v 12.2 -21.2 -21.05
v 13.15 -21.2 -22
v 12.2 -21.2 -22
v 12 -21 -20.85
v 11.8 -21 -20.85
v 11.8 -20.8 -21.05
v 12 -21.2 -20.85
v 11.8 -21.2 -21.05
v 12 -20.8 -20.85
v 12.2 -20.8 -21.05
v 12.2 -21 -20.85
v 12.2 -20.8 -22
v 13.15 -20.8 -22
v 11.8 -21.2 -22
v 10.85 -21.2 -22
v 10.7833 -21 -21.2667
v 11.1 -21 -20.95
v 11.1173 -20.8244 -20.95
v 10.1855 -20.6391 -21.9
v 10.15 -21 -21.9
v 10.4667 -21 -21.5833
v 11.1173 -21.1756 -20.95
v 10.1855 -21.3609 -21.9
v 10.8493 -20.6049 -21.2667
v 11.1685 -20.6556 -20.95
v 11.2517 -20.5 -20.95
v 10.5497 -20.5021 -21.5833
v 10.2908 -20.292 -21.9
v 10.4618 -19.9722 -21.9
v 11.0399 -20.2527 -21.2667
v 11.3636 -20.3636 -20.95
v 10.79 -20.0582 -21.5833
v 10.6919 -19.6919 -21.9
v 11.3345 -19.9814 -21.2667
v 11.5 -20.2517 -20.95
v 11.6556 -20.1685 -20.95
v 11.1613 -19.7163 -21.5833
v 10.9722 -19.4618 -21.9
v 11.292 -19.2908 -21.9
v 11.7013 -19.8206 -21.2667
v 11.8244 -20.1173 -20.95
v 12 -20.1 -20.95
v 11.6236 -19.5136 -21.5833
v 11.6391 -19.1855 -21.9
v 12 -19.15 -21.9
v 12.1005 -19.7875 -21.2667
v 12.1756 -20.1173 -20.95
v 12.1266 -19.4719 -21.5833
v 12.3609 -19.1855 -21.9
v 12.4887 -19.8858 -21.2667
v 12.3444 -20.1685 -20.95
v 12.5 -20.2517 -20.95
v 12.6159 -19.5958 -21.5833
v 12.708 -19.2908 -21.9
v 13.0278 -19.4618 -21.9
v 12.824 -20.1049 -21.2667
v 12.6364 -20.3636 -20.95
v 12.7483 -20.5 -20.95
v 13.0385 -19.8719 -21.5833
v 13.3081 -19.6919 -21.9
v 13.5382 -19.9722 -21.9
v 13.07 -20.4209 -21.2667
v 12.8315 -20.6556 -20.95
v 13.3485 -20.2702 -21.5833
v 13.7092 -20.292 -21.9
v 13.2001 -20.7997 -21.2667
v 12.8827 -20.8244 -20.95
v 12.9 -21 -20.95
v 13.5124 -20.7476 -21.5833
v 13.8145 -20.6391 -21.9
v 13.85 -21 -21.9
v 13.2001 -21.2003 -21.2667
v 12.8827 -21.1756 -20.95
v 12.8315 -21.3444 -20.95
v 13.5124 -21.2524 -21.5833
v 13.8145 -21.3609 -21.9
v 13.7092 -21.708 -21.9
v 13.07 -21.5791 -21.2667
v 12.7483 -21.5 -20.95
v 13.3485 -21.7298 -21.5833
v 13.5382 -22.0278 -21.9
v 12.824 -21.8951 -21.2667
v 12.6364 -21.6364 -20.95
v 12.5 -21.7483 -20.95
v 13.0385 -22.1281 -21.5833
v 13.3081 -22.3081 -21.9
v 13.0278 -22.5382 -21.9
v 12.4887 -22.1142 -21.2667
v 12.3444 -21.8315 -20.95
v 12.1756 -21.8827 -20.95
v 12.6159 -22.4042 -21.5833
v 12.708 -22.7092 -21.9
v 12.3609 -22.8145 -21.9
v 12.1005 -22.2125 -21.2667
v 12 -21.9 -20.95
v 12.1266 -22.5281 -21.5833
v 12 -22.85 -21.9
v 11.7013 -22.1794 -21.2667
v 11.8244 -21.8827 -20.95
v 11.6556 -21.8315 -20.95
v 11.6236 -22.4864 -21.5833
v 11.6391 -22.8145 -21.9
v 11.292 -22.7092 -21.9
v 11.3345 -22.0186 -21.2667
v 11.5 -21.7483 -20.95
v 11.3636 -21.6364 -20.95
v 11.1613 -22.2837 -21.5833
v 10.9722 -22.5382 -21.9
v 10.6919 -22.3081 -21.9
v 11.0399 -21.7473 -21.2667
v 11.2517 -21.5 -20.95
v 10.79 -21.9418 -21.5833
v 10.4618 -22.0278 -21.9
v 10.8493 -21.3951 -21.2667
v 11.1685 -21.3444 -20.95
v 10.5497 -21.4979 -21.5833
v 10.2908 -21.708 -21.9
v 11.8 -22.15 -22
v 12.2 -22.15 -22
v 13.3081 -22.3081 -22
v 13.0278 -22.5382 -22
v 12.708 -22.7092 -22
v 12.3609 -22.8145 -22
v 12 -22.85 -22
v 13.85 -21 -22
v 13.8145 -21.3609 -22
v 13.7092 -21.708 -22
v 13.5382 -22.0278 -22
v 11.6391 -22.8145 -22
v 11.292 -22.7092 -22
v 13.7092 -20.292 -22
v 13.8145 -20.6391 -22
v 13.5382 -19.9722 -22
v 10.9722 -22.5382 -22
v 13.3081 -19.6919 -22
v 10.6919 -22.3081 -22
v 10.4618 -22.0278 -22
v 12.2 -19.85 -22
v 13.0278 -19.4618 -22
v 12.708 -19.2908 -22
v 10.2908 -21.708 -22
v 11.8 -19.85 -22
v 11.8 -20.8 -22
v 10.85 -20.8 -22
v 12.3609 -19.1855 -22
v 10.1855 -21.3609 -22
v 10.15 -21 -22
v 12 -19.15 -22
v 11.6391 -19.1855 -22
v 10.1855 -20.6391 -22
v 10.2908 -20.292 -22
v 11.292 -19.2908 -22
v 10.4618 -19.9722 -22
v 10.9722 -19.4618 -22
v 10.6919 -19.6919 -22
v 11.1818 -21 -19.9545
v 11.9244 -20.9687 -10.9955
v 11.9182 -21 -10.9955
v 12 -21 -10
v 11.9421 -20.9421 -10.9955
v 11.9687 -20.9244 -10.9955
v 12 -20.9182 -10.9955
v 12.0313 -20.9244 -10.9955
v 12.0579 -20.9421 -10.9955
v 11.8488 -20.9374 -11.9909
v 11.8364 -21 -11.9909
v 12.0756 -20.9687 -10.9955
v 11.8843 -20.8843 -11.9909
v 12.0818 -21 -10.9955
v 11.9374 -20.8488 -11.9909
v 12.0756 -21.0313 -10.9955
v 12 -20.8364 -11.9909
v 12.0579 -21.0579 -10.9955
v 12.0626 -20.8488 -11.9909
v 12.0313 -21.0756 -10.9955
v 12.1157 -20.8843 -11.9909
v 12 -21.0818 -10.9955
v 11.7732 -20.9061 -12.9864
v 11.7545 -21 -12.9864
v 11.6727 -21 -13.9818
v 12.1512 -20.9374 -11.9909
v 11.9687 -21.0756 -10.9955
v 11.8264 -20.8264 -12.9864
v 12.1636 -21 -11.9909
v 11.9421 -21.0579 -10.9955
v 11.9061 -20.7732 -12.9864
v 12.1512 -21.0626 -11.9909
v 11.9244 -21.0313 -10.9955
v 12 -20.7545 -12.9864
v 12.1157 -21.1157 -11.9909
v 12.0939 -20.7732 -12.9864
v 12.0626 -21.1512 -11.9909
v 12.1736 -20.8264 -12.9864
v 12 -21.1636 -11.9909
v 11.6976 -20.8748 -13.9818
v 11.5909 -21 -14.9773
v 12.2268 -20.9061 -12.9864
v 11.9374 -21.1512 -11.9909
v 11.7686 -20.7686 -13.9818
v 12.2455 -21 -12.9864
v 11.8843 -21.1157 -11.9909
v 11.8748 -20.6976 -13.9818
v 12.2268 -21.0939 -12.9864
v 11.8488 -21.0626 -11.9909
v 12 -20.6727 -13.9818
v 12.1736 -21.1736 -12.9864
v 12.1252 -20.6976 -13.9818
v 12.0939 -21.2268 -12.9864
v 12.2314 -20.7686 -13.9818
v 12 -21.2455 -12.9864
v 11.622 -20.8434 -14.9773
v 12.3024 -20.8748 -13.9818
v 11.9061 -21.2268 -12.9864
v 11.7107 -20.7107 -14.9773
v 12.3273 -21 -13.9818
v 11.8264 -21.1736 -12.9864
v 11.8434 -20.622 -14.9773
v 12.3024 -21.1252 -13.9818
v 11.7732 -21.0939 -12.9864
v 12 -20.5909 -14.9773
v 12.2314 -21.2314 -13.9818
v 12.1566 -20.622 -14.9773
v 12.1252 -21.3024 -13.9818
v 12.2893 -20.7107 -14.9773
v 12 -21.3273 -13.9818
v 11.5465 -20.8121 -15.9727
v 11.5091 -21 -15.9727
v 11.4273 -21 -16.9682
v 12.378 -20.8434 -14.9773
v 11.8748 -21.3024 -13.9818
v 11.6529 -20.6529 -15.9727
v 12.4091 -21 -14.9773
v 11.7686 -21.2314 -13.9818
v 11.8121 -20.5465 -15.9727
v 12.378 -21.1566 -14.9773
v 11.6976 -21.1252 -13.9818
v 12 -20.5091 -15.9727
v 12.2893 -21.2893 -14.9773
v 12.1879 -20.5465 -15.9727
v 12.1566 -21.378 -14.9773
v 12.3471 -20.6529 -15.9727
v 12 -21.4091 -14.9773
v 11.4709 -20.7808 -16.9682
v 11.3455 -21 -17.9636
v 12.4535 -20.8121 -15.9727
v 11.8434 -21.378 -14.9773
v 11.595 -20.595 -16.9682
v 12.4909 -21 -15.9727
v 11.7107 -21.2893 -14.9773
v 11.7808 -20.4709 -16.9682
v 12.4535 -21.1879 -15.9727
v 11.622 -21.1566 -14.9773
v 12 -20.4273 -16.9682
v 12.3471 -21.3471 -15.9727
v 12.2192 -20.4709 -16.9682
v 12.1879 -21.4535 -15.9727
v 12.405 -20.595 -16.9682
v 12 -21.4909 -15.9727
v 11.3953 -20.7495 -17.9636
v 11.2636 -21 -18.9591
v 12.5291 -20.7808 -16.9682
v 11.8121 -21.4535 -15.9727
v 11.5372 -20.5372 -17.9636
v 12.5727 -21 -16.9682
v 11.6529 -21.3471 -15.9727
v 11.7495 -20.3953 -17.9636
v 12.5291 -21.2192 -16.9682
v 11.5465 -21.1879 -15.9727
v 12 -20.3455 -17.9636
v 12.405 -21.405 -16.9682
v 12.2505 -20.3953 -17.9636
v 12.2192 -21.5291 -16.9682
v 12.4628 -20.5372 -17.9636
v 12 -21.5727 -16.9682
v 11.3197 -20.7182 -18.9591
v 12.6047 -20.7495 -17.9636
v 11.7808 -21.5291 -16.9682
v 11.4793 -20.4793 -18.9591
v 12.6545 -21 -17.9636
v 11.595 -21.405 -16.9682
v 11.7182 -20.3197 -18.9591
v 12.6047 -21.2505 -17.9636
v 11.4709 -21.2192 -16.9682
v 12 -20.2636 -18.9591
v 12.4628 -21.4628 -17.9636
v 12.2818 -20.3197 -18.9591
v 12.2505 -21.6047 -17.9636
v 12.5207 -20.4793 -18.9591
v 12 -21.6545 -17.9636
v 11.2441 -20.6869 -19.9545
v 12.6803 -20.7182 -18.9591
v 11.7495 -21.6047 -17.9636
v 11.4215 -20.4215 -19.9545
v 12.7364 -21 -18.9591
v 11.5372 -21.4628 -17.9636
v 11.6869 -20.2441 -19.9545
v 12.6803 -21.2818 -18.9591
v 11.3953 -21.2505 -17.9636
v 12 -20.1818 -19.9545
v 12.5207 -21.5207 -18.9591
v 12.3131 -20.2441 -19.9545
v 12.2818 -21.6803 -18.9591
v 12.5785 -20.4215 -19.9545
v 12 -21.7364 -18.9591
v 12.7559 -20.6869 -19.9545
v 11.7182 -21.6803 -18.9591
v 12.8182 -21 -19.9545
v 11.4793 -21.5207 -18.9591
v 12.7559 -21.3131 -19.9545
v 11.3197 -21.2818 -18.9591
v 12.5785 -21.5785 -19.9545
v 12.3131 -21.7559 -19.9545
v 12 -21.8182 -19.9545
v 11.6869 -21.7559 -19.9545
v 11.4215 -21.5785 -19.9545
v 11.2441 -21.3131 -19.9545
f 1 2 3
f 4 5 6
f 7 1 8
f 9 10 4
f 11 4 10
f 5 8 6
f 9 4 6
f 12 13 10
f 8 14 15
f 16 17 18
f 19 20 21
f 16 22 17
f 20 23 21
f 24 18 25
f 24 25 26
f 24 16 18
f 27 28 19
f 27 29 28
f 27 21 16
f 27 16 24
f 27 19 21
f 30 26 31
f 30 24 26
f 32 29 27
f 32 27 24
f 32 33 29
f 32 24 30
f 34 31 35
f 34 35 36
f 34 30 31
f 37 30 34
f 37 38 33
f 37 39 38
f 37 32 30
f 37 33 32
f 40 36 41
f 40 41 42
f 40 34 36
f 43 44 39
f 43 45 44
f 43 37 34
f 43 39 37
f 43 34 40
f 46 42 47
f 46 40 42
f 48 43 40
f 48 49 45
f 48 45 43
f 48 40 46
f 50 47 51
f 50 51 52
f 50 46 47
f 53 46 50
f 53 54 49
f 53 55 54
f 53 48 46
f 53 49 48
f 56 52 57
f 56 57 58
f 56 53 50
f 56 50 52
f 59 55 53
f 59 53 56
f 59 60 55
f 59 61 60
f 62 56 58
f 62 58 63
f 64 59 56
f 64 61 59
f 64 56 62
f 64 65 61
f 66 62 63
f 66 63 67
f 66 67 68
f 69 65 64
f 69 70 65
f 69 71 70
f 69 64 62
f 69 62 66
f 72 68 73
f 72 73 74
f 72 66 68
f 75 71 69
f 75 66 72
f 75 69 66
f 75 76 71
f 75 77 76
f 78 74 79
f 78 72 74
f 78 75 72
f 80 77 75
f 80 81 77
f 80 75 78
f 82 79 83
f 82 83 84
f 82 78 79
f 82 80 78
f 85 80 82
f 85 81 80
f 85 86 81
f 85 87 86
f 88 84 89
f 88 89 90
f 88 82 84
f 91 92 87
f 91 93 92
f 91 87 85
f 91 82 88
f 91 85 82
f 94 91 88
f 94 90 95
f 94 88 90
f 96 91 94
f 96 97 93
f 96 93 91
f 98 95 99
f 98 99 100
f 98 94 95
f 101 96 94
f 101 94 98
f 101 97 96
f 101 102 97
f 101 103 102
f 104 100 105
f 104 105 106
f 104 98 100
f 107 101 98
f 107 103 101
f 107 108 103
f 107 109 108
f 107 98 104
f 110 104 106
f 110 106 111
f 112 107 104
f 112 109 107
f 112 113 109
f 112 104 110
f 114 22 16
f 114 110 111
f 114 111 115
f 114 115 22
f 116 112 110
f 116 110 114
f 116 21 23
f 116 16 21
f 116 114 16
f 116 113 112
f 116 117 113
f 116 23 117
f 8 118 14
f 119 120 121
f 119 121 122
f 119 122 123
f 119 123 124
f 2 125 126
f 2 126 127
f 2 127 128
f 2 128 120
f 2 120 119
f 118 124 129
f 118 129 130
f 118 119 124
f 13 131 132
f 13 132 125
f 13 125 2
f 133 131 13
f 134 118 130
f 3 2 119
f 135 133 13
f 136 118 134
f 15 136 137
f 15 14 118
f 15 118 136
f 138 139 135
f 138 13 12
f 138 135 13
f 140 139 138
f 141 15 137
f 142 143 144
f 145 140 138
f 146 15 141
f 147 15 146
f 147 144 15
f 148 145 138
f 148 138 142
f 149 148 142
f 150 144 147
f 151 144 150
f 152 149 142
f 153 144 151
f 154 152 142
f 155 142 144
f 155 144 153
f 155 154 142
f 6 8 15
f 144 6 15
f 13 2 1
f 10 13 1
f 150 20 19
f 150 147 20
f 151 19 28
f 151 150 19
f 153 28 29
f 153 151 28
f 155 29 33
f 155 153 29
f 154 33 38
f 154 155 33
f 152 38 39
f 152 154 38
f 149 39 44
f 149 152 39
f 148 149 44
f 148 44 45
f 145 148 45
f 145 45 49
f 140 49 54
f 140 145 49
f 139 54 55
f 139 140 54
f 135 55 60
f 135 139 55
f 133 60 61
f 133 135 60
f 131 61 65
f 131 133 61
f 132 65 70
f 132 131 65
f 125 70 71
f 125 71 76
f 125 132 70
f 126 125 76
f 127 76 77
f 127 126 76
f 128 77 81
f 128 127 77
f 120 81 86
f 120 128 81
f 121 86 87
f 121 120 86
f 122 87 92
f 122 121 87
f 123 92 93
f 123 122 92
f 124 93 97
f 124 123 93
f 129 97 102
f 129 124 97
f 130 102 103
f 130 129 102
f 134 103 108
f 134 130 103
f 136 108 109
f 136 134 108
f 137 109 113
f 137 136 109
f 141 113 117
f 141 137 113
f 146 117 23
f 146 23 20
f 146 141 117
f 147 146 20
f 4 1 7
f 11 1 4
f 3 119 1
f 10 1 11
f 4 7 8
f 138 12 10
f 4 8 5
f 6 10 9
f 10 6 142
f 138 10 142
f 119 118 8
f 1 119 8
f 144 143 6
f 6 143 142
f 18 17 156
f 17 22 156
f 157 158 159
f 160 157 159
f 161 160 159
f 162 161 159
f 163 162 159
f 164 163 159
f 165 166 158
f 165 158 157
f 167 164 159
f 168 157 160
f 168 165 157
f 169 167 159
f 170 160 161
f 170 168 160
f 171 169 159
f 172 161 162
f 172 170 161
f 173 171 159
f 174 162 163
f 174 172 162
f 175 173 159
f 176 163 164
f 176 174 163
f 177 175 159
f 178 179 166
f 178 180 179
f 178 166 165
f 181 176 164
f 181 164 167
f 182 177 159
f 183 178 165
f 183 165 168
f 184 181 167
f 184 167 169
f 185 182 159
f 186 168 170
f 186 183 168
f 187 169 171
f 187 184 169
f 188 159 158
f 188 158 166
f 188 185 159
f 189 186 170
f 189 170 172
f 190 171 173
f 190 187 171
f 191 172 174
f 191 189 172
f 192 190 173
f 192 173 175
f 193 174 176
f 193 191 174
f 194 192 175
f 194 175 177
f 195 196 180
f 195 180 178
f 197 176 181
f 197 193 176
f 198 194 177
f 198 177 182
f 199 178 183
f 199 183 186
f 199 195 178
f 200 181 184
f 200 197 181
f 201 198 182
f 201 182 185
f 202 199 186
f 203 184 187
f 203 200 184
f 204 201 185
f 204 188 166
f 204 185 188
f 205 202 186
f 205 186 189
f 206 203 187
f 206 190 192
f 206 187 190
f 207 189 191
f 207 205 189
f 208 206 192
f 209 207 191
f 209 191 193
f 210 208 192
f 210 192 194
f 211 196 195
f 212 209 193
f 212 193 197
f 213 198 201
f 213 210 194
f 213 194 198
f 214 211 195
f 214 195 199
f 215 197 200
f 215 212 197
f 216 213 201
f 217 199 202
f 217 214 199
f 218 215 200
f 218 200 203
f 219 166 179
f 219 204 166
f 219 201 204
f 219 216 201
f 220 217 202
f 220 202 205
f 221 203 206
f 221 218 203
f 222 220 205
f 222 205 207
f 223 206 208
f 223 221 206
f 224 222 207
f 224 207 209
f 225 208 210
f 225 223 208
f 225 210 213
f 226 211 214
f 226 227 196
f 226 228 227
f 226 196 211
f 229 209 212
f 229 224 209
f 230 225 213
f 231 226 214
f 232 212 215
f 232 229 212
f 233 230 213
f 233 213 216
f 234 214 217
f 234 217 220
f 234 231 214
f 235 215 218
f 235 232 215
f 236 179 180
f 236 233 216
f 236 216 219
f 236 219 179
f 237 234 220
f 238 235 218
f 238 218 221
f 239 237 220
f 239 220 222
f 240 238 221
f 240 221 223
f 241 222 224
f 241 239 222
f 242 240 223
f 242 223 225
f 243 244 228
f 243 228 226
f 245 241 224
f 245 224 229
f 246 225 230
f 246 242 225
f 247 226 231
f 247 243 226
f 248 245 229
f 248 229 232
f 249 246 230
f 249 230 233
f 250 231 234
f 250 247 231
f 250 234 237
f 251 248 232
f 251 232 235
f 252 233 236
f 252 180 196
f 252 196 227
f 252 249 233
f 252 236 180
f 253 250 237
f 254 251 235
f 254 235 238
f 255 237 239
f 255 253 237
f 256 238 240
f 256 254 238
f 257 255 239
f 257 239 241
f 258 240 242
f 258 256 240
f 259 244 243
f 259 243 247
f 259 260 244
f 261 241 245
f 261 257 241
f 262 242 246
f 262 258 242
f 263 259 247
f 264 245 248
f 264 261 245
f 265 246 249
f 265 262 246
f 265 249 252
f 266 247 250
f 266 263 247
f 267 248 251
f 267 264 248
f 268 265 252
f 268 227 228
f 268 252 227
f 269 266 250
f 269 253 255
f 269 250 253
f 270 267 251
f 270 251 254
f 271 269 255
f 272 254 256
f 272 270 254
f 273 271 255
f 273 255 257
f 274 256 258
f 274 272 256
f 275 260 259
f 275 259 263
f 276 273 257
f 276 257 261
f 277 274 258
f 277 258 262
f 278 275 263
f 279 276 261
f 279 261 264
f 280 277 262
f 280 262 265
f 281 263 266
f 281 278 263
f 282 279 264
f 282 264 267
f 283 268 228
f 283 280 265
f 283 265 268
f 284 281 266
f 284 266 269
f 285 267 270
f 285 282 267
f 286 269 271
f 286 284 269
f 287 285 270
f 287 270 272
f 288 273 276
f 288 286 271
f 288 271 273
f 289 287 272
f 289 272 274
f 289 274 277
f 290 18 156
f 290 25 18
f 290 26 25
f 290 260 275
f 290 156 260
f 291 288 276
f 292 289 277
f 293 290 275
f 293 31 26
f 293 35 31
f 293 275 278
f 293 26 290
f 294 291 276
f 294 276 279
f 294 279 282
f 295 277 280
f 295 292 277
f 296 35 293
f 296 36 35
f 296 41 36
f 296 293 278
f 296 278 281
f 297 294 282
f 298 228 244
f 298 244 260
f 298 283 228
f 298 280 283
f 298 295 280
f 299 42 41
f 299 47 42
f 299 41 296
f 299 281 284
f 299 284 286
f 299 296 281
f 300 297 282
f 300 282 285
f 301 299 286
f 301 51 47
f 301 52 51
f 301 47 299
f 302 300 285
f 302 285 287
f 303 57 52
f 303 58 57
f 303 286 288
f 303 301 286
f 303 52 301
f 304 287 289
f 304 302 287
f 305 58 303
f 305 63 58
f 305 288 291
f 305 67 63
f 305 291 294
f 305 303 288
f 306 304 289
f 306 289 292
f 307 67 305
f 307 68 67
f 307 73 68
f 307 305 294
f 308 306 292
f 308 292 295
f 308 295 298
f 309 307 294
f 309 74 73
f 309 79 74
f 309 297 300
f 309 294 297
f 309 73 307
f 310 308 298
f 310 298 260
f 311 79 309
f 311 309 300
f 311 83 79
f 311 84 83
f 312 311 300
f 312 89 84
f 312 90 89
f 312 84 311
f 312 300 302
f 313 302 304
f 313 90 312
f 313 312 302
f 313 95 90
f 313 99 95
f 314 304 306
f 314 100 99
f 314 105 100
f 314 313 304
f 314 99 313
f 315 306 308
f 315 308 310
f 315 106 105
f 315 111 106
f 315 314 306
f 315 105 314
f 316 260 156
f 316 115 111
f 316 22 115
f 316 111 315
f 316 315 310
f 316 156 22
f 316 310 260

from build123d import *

# Parameters (mm, degrees)
POCKET005_DEPTH         = 0.2
POLARPATTERN005_COUNT   = 2
POLARPATTERN005_ANGLE   = 90
BODY009_PLACEMENT_ANGLE = 180


with BuildPart() as part:
    # Sketch017 → Revolution005 (revolve)
    with BuildSketch(Plane.XZ):
        Polygon((0, 0), (0, -12), (0.9, -1.05), (1.85, -0.1), (1.85, 0), align=None)
    revolve(axis=Axis((0, 0, 0), (0, 0, 1)))

    # Sketch018 → Pocket005 (cut, symmetric)
    with BuildSketch(Plane.XZ):
        Polygon((-1.15, 0), (0, -1.15), (1.15, 0), align=None)
    pocket005 = extrude(amount=POCKET005_DEPTH, both=True, mode=Mode.SUBTRACT)

    # PolarPattern005: Pocket005 ×2 about axis
    polarpattern005_axis = Axis((0, 0, 0), (0, 0, 1))
    for i in range(1, POLARPATTERN005_COUNT):
        add(pocket005.rotate(polarpattern005_axis, i * POLARPATTERN005_ANGLE / (POLARPATTERN005_COUNT - 1)), mode=Mode.SUBTRACT)


with BuildPart() as part_1:
    # Body009 placement: moved
    add(part.part.moved(Location((12, -21, -22))).rotate(Axis((12, -21, -22), (0, 1, 0)), BODY009_PLACEMENT_ANGLE))


solid = part_1.part
